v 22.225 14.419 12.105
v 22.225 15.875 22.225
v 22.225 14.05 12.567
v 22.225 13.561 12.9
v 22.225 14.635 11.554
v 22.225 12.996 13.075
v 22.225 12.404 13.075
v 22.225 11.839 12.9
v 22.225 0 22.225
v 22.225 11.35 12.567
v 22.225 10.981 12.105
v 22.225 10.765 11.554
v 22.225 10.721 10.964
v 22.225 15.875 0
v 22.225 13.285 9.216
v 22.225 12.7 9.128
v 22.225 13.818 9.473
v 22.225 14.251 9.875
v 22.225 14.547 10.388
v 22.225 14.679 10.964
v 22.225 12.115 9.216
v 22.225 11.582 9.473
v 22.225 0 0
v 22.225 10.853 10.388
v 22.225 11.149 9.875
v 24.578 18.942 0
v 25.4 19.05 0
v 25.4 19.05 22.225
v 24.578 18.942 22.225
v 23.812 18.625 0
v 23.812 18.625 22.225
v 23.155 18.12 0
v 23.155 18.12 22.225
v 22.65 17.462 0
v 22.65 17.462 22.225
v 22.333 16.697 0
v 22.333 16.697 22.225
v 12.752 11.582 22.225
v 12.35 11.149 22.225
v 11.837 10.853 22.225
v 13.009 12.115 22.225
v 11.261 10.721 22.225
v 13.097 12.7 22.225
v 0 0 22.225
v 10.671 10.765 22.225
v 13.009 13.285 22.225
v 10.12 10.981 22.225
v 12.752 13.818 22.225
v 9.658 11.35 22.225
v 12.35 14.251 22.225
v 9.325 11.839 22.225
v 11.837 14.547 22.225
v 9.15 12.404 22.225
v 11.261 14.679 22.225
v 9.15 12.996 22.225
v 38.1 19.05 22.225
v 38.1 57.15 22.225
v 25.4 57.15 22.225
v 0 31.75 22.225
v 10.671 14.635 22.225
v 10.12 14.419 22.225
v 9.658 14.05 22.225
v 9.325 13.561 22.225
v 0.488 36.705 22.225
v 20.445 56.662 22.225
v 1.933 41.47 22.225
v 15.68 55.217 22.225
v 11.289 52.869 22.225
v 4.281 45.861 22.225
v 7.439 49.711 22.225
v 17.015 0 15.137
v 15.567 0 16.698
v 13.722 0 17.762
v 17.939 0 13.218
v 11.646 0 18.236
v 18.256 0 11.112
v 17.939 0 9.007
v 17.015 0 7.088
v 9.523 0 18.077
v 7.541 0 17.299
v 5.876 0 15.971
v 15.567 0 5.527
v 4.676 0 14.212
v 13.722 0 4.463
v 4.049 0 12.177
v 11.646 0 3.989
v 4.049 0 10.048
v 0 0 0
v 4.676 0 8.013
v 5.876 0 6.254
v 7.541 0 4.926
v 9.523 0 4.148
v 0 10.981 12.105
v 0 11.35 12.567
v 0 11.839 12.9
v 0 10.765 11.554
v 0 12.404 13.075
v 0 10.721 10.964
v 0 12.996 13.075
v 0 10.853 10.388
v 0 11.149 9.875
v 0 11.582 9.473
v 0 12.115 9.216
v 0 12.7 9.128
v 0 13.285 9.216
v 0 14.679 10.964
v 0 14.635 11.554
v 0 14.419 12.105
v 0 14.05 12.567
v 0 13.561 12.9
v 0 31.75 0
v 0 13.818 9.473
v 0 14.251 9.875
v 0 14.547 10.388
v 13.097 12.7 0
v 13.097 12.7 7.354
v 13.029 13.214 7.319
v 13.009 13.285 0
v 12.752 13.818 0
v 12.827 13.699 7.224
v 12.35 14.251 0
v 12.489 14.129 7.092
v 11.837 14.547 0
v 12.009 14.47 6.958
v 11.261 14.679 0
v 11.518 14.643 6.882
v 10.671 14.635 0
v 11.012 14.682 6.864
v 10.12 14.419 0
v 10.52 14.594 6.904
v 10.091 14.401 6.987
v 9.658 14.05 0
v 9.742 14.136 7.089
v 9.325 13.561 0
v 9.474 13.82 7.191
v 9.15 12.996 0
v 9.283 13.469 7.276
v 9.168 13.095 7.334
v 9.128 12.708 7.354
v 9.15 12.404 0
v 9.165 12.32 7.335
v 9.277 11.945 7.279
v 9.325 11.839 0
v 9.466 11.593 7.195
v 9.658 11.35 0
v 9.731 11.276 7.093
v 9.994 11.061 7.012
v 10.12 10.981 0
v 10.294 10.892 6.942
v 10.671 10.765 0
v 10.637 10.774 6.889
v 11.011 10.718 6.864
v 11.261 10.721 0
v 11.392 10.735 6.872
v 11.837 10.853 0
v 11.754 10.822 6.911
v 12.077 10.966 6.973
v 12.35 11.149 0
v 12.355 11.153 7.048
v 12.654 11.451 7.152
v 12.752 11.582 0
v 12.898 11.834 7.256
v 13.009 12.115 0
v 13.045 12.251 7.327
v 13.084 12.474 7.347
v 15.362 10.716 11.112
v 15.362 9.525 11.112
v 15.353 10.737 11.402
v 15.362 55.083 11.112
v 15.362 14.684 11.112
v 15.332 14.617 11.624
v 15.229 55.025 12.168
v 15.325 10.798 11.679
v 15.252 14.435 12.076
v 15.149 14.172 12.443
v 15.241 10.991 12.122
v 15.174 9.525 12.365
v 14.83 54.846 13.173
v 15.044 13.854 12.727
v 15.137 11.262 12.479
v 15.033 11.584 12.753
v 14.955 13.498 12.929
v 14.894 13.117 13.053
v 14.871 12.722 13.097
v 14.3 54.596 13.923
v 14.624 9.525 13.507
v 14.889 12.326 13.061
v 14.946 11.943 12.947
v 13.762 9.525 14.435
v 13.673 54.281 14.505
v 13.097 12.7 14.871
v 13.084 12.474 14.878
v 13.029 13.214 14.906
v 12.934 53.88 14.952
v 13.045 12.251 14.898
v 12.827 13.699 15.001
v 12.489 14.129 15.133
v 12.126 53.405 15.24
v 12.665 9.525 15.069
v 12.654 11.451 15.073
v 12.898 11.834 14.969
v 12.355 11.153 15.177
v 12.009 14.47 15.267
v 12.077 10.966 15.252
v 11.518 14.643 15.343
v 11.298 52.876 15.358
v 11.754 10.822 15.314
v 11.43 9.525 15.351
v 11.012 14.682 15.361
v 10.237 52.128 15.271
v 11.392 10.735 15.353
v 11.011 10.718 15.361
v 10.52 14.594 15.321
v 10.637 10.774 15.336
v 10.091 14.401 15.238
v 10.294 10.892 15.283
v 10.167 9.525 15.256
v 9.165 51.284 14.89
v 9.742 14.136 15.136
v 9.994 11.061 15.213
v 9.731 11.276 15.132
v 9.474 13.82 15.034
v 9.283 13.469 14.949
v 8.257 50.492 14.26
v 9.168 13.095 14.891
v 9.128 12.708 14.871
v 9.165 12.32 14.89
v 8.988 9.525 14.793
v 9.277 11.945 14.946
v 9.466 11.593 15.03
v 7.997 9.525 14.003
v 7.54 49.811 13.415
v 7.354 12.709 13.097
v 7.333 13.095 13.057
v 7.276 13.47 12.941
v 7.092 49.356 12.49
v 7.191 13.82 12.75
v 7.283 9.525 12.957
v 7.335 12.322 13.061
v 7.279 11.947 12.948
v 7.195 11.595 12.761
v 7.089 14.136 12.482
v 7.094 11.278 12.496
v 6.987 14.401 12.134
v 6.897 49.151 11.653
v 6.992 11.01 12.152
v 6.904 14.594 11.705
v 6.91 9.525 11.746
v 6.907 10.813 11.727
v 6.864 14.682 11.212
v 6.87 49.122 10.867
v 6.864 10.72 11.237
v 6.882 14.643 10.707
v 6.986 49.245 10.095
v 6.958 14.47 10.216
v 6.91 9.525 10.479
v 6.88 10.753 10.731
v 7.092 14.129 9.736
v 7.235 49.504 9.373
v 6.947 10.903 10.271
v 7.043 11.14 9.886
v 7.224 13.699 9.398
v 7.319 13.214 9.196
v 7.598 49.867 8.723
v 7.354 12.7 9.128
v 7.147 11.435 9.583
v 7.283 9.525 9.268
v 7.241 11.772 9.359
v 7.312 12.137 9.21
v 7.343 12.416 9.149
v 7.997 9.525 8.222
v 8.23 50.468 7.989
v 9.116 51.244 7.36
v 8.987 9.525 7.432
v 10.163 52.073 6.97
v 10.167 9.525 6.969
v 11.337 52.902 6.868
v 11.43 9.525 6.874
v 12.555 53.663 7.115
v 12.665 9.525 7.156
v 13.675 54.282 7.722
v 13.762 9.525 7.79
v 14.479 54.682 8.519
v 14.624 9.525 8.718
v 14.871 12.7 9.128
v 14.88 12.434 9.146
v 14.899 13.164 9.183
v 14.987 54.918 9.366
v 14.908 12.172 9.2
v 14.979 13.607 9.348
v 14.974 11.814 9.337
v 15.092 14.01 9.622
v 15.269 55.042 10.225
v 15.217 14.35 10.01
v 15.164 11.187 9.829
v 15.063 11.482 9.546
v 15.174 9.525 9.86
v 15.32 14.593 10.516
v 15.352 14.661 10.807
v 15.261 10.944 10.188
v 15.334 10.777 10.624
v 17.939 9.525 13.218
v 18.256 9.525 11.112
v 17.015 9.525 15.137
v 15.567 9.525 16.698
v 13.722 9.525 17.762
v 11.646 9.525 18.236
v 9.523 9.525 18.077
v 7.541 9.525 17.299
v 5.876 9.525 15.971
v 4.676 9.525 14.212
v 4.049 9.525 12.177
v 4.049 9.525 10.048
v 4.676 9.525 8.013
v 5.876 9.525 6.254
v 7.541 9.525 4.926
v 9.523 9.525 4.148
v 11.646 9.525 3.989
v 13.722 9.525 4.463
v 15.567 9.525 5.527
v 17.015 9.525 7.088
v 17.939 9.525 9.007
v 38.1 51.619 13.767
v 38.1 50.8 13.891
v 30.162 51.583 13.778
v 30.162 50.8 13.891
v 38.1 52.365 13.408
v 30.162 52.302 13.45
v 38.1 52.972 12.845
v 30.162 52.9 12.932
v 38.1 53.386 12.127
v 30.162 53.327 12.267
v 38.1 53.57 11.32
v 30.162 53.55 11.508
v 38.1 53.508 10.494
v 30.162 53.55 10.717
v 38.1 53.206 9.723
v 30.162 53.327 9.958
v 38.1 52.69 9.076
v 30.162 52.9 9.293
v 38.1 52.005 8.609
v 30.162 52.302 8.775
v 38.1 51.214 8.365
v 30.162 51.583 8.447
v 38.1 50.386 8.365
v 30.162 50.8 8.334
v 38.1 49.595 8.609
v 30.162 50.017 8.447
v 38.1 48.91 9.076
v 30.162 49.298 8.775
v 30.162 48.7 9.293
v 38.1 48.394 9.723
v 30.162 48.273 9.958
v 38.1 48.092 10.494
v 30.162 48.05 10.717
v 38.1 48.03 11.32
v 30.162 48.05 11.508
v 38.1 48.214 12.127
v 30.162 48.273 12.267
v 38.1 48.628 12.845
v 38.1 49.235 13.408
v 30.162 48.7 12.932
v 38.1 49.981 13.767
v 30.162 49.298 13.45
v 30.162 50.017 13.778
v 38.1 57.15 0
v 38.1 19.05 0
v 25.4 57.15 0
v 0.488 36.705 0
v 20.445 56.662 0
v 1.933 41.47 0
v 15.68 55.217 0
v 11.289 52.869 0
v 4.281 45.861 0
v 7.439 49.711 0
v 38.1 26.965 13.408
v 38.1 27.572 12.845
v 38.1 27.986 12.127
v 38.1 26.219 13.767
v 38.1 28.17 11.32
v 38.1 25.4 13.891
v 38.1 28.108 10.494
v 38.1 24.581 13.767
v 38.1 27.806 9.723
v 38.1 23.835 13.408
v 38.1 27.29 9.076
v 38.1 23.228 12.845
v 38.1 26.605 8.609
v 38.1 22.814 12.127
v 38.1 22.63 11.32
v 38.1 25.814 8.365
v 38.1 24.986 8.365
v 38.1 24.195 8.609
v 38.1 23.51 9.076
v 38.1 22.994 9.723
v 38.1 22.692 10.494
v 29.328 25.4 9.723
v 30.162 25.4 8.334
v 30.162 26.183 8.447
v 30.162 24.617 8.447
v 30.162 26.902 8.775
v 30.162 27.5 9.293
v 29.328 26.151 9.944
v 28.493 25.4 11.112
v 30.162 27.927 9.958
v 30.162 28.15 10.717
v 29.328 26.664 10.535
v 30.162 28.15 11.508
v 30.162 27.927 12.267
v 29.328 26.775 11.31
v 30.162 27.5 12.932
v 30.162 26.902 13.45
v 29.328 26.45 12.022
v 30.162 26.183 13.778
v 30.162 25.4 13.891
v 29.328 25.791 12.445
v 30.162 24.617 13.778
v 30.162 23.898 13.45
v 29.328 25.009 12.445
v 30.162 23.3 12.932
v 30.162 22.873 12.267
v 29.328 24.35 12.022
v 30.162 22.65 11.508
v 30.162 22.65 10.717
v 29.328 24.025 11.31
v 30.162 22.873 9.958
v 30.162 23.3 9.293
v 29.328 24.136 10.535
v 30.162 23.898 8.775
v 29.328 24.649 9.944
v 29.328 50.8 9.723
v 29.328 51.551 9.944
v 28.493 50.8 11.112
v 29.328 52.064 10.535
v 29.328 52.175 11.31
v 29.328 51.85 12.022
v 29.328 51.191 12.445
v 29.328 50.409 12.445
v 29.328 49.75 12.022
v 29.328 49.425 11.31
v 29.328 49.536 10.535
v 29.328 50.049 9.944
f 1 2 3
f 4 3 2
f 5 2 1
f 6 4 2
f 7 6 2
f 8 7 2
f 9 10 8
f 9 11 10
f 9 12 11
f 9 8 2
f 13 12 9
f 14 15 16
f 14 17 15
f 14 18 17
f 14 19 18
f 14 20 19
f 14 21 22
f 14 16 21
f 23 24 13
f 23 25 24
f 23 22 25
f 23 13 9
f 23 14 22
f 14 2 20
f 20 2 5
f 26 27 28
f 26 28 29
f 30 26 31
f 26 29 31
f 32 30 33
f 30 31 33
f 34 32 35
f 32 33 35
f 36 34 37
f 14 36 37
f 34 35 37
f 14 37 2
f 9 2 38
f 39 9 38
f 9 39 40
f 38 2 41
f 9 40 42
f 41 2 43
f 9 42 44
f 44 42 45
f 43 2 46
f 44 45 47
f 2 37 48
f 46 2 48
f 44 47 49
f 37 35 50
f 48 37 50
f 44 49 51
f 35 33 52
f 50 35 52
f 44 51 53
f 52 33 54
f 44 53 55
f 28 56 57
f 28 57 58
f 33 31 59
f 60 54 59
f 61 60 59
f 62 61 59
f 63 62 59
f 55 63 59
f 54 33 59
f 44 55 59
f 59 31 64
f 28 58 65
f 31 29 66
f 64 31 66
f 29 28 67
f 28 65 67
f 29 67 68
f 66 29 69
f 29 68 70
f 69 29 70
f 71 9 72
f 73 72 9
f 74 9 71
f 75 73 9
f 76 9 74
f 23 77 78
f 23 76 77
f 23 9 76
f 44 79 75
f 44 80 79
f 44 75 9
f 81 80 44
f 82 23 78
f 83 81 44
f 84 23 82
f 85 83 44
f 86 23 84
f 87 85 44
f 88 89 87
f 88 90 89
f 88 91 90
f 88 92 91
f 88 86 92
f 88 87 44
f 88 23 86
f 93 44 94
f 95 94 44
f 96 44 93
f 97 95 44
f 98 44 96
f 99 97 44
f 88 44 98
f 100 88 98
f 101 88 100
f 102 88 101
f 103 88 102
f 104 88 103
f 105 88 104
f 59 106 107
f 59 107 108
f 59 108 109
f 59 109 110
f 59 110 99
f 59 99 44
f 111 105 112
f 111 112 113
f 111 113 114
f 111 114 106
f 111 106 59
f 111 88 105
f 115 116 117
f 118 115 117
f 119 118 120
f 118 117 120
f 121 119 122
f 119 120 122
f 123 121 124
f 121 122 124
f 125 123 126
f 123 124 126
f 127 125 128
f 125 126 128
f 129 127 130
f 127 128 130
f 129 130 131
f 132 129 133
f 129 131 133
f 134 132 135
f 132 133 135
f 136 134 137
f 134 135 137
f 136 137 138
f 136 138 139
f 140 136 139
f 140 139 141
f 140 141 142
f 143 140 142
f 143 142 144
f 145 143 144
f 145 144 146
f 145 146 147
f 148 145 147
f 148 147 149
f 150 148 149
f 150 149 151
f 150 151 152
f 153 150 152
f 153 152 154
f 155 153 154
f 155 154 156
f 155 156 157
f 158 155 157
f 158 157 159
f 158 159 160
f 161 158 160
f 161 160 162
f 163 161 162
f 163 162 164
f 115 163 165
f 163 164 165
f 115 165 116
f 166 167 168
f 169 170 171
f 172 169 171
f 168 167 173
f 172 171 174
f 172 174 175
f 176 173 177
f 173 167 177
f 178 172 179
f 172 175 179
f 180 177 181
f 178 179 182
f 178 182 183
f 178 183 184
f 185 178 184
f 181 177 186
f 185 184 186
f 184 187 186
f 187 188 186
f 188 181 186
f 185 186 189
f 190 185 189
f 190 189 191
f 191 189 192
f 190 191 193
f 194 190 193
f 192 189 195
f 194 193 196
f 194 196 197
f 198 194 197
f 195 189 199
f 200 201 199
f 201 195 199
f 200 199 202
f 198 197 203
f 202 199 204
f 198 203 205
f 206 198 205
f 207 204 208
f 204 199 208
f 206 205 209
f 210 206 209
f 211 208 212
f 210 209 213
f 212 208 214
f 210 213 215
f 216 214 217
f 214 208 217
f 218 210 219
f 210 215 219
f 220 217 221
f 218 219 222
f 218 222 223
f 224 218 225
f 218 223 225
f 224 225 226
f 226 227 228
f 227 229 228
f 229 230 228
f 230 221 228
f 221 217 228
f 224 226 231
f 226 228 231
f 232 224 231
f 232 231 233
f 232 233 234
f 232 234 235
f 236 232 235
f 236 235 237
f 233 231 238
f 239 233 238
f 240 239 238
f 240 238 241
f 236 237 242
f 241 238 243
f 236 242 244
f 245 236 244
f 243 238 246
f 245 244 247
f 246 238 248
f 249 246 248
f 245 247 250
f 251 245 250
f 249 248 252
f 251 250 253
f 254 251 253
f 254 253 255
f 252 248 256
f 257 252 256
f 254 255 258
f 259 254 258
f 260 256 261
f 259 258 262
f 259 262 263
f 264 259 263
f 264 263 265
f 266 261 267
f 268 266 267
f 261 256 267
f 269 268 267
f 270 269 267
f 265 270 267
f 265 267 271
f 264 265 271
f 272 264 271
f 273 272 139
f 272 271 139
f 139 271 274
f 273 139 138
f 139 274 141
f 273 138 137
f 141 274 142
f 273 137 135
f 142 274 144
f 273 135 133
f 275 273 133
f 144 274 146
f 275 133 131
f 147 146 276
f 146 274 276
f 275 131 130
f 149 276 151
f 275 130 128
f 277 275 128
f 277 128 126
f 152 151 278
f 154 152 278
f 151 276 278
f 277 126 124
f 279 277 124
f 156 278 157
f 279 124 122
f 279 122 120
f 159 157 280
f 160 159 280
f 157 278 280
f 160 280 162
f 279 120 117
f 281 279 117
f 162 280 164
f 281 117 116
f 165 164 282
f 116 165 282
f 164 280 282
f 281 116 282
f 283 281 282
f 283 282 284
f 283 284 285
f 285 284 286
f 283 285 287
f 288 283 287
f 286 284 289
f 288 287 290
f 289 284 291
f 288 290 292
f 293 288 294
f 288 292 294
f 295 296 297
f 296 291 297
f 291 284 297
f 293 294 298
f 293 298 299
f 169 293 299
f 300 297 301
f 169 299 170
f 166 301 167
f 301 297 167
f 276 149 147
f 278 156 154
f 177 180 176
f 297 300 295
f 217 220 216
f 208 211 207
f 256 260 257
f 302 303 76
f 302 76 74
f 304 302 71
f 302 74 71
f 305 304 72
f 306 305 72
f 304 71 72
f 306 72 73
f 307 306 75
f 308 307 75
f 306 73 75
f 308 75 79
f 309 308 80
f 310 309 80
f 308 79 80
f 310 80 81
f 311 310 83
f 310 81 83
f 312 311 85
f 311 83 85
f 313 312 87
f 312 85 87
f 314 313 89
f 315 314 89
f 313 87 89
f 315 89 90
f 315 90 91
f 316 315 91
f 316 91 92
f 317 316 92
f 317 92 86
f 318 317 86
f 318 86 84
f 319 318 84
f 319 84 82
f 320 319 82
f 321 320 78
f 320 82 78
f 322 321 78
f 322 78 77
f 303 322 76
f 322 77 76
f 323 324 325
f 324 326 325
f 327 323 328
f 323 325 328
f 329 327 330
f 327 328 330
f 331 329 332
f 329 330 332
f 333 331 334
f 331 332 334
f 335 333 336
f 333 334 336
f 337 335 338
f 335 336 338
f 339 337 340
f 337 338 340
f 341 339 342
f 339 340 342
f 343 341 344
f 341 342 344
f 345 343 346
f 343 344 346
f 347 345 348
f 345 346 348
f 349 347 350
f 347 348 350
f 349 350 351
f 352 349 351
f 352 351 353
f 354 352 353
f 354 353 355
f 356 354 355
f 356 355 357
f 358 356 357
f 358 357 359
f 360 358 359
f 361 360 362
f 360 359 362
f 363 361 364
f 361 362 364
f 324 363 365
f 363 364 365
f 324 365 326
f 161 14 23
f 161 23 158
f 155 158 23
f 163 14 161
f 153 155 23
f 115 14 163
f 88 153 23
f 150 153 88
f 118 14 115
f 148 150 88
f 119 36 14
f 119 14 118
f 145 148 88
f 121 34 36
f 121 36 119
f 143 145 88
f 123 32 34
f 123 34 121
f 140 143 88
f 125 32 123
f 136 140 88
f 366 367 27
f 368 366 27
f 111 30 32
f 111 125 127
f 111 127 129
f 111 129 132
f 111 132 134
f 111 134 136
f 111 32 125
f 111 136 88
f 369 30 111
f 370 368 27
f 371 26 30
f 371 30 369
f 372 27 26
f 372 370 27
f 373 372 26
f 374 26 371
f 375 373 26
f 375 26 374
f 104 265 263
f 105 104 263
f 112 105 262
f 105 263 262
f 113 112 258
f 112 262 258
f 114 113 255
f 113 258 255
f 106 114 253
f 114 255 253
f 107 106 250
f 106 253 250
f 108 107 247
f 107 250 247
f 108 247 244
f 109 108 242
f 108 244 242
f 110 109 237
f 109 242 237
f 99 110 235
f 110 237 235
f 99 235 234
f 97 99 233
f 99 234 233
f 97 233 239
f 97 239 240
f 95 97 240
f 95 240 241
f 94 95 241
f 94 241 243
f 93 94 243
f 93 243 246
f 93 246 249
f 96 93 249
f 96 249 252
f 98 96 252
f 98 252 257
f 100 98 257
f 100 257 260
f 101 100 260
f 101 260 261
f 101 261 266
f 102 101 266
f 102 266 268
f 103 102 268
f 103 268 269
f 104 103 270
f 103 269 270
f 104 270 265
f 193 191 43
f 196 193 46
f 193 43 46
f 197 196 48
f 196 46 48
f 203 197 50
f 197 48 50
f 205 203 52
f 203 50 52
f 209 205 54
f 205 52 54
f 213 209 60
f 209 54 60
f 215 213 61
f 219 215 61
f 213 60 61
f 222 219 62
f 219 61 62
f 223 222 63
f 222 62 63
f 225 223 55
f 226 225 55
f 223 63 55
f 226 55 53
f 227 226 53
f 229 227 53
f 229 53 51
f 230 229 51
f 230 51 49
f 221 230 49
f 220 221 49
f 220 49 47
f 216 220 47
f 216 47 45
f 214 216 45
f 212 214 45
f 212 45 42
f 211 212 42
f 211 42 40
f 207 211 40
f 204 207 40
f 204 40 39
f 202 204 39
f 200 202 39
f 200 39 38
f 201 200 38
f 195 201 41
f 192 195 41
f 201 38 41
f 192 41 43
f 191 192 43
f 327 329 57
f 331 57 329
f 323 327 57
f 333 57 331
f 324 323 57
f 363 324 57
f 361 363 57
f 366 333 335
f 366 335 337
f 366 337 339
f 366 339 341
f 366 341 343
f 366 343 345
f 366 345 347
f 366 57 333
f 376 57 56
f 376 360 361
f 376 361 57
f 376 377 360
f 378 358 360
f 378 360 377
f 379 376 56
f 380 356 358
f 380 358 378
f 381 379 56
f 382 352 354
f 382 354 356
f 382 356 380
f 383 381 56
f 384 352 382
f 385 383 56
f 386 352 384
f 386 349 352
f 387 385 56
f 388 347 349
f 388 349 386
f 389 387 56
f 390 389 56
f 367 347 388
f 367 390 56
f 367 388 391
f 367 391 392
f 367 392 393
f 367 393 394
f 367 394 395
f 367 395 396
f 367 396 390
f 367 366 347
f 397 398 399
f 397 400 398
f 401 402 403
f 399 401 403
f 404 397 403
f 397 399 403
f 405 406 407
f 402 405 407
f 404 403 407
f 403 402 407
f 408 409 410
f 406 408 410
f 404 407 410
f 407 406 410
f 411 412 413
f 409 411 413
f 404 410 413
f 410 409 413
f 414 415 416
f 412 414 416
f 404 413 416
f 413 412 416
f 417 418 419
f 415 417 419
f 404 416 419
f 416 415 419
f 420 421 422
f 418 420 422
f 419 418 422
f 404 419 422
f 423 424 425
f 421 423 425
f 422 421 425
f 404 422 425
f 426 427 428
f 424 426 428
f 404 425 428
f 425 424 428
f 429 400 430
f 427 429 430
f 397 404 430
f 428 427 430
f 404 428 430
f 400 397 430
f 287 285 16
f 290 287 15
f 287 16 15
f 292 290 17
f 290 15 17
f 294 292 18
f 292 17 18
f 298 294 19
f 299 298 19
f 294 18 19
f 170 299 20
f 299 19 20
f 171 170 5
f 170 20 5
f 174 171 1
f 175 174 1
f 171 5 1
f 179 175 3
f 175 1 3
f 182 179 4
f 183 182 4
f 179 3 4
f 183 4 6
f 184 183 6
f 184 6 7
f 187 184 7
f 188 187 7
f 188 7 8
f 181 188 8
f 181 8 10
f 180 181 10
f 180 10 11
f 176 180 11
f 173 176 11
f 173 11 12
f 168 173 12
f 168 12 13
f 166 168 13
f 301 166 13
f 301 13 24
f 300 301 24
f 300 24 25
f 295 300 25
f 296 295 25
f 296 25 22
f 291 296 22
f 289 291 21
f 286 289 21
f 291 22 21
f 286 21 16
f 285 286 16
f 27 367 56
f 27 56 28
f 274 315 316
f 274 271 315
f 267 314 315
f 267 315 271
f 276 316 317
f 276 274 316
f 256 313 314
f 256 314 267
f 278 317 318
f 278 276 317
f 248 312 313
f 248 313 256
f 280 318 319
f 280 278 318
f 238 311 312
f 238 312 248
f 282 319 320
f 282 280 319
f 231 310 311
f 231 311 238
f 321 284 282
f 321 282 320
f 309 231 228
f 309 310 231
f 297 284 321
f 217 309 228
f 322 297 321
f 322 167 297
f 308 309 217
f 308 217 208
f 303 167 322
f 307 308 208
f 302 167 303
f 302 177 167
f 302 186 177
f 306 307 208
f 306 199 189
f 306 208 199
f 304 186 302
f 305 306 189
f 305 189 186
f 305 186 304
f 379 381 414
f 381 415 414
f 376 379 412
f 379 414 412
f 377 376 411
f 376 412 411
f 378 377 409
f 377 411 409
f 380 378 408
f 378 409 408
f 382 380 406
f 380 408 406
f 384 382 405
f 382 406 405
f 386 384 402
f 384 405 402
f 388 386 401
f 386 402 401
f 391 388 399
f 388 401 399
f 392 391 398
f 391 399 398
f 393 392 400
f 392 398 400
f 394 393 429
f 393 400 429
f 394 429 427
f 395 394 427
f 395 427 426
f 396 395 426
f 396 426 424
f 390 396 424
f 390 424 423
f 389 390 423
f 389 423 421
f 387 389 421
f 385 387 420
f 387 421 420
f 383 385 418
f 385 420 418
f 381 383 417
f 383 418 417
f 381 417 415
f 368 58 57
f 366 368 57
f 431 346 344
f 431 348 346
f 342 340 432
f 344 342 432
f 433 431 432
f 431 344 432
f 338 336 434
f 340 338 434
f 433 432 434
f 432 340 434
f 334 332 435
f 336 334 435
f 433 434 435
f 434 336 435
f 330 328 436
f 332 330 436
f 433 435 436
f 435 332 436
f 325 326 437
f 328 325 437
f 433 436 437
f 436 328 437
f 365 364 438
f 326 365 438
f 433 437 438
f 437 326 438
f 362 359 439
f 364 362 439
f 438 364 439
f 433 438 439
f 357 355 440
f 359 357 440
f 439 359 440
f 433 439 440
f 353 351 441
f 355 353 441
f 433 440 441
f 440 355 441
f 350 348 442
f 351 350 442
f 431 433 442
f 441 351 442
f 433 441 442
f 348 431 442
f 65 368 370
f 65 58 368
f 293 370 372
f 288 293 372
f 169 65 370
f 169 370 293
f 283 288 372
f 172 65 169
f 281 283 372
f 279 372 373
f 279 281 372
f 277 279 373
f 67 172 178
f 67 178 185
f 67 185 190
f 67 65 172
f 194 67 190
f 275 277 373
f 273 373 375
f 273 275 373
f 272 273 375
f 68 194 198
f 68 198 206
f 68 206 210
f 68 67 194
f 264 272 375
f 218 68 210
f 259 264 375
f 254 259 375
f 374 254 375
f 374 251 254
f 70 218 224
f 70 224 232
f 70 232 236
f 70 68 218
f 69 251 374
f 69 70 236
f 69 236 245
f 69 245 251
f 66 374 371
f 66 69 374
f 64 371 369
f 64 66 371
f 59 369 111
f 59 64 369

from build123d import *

# Parameters (mm, degrees)
BOSS_EXTRUDE1_DEPTH                 = 22.225
FILLET1_R                           = 3.175
FILLET2_R                           = 25.4
SKETCH3_R                           = 7.14375
CUT_EXTRUDE1_DEPTH                  = 9.525
SKETCH4_R                           = 4.25
CUT_EXTRUDE2_DEPTH                  = 58.15
F_7_32_0_21875_DIAMETER_HOLE1_D     = 5.55625
F_7_32_0_21875_DIAMETER_HOLE1_DEPTH = 7.9375
F_7_32_0_21875_DIAMETER_HOLE1_TIP   = 1.669265907
SKETCH9_R                           = 1.984375
CUT_EXTRUDE3_DEPTH                  = 23.2250001
SKETCH10_R                          = 1.984375
CUT_EXTRUDE4_DEPTH                  = 23.2250001


with BuildPart() as part:
    # Sketch1 → Boss-Extrude1 (new body)
    with BuildSketch(Plane.XY):
        Polygon((0, 0), (0, 57.15), (38.1, 57.15), (38.1, 19.05), (22.225, 19.05), (22.225, 0), align=None)
    extrude(amount=BOSS_EXTRUDE1_DEPTH)

    # Fillet1
    fillet1_edges = [part.edges().sort_by_distance(p)[0] for p in [
        (22.225, 19.05, 11.1125),
    ]]
    fillet(fillet1_edges, radius=FILLET1_R)

    # Fillet2
    fillet2_edges = [part.edges().sort_by_distance(p)[0] for p in [
        (0, 57.15, 11.1125),
    ]]
    fillet(fillet2_edges, radius=FILLET2_R)

    # Sketch3 → Cut-Extrude1 (cut)
    with BuildSketch(Plane.XZ):
        with Locations((11.1125, 11.1125)):
            Circle(SKETCH3_R)
    extrude(amount=-CUT_EXTRUDE1_DEPTH, mode=Mode.SUBTRACT)

    # Sketch4 → Cut-Extrude2 (cut, through all)
    with BuildSketch(Plane.XZ):
        with Locations((11.1125, 11.1125)):
            Circle(SKETCH4_R)
    extrude(amount=-CUT_EXTRUDE2_DEPTH, mode=Mode.SUBTRACT)

    # 7/32 (0.21875) Diameter Hole1
    with Locations(Plane(origin=(38.1, 0, 0), x_dir=(0, 0, -1), z_dir=(1, 0, 0))):
        with Locations((-11.1125, 50.8), (-11.1125, 25.4)):
            Hole(F_7_32_0_21875_DIAMETER_HOLE1_D / 2, depth=F_7_32_0_21875_DIAMETER_HOLE1_DEPTH)
            with Locations((0, 0, -(F_7_32_0_21875_DIAMETER_HOLE1_DEPTH + F_7_32_0_21875_DIAMETER_HOLE1_TIP / 2))):  # 118° drill point
                Cone(0, F_7_32_0_21875_DIAMETER_HOLE1_D / 2, F_7_32_0_21875_DIAMETER_HOLE1_TIP, mode=Mode.SUBTRACT)

    # Sketch9 → Cut-Extrude3 (cut, through all)
    with BuildSketch(Plane(origin=(22.225, 0, 0), x_dir=(0, 0, -1), z_dir=(1, 0, 0))):
        with Locations((-11.1125, 12.7)):
            Circle(SKETCH9_R)
    extrude(amount=-CUT_EXTRUDE3_DEPTH, mode=Mode.SUBTRACT)

    # Sketch10 → Cut-Extrude4 (cut, through all)
    with BuildSketch(Plane.XY.offset(22.225)):
        with Locations((11.1125, 12.7)):
            Circle(SKETCH10_R)
    extrude(amount=-CUT_EXTRUDE4_DEPTH, mode=Mode.SUBTRACT)


solid = part.part
